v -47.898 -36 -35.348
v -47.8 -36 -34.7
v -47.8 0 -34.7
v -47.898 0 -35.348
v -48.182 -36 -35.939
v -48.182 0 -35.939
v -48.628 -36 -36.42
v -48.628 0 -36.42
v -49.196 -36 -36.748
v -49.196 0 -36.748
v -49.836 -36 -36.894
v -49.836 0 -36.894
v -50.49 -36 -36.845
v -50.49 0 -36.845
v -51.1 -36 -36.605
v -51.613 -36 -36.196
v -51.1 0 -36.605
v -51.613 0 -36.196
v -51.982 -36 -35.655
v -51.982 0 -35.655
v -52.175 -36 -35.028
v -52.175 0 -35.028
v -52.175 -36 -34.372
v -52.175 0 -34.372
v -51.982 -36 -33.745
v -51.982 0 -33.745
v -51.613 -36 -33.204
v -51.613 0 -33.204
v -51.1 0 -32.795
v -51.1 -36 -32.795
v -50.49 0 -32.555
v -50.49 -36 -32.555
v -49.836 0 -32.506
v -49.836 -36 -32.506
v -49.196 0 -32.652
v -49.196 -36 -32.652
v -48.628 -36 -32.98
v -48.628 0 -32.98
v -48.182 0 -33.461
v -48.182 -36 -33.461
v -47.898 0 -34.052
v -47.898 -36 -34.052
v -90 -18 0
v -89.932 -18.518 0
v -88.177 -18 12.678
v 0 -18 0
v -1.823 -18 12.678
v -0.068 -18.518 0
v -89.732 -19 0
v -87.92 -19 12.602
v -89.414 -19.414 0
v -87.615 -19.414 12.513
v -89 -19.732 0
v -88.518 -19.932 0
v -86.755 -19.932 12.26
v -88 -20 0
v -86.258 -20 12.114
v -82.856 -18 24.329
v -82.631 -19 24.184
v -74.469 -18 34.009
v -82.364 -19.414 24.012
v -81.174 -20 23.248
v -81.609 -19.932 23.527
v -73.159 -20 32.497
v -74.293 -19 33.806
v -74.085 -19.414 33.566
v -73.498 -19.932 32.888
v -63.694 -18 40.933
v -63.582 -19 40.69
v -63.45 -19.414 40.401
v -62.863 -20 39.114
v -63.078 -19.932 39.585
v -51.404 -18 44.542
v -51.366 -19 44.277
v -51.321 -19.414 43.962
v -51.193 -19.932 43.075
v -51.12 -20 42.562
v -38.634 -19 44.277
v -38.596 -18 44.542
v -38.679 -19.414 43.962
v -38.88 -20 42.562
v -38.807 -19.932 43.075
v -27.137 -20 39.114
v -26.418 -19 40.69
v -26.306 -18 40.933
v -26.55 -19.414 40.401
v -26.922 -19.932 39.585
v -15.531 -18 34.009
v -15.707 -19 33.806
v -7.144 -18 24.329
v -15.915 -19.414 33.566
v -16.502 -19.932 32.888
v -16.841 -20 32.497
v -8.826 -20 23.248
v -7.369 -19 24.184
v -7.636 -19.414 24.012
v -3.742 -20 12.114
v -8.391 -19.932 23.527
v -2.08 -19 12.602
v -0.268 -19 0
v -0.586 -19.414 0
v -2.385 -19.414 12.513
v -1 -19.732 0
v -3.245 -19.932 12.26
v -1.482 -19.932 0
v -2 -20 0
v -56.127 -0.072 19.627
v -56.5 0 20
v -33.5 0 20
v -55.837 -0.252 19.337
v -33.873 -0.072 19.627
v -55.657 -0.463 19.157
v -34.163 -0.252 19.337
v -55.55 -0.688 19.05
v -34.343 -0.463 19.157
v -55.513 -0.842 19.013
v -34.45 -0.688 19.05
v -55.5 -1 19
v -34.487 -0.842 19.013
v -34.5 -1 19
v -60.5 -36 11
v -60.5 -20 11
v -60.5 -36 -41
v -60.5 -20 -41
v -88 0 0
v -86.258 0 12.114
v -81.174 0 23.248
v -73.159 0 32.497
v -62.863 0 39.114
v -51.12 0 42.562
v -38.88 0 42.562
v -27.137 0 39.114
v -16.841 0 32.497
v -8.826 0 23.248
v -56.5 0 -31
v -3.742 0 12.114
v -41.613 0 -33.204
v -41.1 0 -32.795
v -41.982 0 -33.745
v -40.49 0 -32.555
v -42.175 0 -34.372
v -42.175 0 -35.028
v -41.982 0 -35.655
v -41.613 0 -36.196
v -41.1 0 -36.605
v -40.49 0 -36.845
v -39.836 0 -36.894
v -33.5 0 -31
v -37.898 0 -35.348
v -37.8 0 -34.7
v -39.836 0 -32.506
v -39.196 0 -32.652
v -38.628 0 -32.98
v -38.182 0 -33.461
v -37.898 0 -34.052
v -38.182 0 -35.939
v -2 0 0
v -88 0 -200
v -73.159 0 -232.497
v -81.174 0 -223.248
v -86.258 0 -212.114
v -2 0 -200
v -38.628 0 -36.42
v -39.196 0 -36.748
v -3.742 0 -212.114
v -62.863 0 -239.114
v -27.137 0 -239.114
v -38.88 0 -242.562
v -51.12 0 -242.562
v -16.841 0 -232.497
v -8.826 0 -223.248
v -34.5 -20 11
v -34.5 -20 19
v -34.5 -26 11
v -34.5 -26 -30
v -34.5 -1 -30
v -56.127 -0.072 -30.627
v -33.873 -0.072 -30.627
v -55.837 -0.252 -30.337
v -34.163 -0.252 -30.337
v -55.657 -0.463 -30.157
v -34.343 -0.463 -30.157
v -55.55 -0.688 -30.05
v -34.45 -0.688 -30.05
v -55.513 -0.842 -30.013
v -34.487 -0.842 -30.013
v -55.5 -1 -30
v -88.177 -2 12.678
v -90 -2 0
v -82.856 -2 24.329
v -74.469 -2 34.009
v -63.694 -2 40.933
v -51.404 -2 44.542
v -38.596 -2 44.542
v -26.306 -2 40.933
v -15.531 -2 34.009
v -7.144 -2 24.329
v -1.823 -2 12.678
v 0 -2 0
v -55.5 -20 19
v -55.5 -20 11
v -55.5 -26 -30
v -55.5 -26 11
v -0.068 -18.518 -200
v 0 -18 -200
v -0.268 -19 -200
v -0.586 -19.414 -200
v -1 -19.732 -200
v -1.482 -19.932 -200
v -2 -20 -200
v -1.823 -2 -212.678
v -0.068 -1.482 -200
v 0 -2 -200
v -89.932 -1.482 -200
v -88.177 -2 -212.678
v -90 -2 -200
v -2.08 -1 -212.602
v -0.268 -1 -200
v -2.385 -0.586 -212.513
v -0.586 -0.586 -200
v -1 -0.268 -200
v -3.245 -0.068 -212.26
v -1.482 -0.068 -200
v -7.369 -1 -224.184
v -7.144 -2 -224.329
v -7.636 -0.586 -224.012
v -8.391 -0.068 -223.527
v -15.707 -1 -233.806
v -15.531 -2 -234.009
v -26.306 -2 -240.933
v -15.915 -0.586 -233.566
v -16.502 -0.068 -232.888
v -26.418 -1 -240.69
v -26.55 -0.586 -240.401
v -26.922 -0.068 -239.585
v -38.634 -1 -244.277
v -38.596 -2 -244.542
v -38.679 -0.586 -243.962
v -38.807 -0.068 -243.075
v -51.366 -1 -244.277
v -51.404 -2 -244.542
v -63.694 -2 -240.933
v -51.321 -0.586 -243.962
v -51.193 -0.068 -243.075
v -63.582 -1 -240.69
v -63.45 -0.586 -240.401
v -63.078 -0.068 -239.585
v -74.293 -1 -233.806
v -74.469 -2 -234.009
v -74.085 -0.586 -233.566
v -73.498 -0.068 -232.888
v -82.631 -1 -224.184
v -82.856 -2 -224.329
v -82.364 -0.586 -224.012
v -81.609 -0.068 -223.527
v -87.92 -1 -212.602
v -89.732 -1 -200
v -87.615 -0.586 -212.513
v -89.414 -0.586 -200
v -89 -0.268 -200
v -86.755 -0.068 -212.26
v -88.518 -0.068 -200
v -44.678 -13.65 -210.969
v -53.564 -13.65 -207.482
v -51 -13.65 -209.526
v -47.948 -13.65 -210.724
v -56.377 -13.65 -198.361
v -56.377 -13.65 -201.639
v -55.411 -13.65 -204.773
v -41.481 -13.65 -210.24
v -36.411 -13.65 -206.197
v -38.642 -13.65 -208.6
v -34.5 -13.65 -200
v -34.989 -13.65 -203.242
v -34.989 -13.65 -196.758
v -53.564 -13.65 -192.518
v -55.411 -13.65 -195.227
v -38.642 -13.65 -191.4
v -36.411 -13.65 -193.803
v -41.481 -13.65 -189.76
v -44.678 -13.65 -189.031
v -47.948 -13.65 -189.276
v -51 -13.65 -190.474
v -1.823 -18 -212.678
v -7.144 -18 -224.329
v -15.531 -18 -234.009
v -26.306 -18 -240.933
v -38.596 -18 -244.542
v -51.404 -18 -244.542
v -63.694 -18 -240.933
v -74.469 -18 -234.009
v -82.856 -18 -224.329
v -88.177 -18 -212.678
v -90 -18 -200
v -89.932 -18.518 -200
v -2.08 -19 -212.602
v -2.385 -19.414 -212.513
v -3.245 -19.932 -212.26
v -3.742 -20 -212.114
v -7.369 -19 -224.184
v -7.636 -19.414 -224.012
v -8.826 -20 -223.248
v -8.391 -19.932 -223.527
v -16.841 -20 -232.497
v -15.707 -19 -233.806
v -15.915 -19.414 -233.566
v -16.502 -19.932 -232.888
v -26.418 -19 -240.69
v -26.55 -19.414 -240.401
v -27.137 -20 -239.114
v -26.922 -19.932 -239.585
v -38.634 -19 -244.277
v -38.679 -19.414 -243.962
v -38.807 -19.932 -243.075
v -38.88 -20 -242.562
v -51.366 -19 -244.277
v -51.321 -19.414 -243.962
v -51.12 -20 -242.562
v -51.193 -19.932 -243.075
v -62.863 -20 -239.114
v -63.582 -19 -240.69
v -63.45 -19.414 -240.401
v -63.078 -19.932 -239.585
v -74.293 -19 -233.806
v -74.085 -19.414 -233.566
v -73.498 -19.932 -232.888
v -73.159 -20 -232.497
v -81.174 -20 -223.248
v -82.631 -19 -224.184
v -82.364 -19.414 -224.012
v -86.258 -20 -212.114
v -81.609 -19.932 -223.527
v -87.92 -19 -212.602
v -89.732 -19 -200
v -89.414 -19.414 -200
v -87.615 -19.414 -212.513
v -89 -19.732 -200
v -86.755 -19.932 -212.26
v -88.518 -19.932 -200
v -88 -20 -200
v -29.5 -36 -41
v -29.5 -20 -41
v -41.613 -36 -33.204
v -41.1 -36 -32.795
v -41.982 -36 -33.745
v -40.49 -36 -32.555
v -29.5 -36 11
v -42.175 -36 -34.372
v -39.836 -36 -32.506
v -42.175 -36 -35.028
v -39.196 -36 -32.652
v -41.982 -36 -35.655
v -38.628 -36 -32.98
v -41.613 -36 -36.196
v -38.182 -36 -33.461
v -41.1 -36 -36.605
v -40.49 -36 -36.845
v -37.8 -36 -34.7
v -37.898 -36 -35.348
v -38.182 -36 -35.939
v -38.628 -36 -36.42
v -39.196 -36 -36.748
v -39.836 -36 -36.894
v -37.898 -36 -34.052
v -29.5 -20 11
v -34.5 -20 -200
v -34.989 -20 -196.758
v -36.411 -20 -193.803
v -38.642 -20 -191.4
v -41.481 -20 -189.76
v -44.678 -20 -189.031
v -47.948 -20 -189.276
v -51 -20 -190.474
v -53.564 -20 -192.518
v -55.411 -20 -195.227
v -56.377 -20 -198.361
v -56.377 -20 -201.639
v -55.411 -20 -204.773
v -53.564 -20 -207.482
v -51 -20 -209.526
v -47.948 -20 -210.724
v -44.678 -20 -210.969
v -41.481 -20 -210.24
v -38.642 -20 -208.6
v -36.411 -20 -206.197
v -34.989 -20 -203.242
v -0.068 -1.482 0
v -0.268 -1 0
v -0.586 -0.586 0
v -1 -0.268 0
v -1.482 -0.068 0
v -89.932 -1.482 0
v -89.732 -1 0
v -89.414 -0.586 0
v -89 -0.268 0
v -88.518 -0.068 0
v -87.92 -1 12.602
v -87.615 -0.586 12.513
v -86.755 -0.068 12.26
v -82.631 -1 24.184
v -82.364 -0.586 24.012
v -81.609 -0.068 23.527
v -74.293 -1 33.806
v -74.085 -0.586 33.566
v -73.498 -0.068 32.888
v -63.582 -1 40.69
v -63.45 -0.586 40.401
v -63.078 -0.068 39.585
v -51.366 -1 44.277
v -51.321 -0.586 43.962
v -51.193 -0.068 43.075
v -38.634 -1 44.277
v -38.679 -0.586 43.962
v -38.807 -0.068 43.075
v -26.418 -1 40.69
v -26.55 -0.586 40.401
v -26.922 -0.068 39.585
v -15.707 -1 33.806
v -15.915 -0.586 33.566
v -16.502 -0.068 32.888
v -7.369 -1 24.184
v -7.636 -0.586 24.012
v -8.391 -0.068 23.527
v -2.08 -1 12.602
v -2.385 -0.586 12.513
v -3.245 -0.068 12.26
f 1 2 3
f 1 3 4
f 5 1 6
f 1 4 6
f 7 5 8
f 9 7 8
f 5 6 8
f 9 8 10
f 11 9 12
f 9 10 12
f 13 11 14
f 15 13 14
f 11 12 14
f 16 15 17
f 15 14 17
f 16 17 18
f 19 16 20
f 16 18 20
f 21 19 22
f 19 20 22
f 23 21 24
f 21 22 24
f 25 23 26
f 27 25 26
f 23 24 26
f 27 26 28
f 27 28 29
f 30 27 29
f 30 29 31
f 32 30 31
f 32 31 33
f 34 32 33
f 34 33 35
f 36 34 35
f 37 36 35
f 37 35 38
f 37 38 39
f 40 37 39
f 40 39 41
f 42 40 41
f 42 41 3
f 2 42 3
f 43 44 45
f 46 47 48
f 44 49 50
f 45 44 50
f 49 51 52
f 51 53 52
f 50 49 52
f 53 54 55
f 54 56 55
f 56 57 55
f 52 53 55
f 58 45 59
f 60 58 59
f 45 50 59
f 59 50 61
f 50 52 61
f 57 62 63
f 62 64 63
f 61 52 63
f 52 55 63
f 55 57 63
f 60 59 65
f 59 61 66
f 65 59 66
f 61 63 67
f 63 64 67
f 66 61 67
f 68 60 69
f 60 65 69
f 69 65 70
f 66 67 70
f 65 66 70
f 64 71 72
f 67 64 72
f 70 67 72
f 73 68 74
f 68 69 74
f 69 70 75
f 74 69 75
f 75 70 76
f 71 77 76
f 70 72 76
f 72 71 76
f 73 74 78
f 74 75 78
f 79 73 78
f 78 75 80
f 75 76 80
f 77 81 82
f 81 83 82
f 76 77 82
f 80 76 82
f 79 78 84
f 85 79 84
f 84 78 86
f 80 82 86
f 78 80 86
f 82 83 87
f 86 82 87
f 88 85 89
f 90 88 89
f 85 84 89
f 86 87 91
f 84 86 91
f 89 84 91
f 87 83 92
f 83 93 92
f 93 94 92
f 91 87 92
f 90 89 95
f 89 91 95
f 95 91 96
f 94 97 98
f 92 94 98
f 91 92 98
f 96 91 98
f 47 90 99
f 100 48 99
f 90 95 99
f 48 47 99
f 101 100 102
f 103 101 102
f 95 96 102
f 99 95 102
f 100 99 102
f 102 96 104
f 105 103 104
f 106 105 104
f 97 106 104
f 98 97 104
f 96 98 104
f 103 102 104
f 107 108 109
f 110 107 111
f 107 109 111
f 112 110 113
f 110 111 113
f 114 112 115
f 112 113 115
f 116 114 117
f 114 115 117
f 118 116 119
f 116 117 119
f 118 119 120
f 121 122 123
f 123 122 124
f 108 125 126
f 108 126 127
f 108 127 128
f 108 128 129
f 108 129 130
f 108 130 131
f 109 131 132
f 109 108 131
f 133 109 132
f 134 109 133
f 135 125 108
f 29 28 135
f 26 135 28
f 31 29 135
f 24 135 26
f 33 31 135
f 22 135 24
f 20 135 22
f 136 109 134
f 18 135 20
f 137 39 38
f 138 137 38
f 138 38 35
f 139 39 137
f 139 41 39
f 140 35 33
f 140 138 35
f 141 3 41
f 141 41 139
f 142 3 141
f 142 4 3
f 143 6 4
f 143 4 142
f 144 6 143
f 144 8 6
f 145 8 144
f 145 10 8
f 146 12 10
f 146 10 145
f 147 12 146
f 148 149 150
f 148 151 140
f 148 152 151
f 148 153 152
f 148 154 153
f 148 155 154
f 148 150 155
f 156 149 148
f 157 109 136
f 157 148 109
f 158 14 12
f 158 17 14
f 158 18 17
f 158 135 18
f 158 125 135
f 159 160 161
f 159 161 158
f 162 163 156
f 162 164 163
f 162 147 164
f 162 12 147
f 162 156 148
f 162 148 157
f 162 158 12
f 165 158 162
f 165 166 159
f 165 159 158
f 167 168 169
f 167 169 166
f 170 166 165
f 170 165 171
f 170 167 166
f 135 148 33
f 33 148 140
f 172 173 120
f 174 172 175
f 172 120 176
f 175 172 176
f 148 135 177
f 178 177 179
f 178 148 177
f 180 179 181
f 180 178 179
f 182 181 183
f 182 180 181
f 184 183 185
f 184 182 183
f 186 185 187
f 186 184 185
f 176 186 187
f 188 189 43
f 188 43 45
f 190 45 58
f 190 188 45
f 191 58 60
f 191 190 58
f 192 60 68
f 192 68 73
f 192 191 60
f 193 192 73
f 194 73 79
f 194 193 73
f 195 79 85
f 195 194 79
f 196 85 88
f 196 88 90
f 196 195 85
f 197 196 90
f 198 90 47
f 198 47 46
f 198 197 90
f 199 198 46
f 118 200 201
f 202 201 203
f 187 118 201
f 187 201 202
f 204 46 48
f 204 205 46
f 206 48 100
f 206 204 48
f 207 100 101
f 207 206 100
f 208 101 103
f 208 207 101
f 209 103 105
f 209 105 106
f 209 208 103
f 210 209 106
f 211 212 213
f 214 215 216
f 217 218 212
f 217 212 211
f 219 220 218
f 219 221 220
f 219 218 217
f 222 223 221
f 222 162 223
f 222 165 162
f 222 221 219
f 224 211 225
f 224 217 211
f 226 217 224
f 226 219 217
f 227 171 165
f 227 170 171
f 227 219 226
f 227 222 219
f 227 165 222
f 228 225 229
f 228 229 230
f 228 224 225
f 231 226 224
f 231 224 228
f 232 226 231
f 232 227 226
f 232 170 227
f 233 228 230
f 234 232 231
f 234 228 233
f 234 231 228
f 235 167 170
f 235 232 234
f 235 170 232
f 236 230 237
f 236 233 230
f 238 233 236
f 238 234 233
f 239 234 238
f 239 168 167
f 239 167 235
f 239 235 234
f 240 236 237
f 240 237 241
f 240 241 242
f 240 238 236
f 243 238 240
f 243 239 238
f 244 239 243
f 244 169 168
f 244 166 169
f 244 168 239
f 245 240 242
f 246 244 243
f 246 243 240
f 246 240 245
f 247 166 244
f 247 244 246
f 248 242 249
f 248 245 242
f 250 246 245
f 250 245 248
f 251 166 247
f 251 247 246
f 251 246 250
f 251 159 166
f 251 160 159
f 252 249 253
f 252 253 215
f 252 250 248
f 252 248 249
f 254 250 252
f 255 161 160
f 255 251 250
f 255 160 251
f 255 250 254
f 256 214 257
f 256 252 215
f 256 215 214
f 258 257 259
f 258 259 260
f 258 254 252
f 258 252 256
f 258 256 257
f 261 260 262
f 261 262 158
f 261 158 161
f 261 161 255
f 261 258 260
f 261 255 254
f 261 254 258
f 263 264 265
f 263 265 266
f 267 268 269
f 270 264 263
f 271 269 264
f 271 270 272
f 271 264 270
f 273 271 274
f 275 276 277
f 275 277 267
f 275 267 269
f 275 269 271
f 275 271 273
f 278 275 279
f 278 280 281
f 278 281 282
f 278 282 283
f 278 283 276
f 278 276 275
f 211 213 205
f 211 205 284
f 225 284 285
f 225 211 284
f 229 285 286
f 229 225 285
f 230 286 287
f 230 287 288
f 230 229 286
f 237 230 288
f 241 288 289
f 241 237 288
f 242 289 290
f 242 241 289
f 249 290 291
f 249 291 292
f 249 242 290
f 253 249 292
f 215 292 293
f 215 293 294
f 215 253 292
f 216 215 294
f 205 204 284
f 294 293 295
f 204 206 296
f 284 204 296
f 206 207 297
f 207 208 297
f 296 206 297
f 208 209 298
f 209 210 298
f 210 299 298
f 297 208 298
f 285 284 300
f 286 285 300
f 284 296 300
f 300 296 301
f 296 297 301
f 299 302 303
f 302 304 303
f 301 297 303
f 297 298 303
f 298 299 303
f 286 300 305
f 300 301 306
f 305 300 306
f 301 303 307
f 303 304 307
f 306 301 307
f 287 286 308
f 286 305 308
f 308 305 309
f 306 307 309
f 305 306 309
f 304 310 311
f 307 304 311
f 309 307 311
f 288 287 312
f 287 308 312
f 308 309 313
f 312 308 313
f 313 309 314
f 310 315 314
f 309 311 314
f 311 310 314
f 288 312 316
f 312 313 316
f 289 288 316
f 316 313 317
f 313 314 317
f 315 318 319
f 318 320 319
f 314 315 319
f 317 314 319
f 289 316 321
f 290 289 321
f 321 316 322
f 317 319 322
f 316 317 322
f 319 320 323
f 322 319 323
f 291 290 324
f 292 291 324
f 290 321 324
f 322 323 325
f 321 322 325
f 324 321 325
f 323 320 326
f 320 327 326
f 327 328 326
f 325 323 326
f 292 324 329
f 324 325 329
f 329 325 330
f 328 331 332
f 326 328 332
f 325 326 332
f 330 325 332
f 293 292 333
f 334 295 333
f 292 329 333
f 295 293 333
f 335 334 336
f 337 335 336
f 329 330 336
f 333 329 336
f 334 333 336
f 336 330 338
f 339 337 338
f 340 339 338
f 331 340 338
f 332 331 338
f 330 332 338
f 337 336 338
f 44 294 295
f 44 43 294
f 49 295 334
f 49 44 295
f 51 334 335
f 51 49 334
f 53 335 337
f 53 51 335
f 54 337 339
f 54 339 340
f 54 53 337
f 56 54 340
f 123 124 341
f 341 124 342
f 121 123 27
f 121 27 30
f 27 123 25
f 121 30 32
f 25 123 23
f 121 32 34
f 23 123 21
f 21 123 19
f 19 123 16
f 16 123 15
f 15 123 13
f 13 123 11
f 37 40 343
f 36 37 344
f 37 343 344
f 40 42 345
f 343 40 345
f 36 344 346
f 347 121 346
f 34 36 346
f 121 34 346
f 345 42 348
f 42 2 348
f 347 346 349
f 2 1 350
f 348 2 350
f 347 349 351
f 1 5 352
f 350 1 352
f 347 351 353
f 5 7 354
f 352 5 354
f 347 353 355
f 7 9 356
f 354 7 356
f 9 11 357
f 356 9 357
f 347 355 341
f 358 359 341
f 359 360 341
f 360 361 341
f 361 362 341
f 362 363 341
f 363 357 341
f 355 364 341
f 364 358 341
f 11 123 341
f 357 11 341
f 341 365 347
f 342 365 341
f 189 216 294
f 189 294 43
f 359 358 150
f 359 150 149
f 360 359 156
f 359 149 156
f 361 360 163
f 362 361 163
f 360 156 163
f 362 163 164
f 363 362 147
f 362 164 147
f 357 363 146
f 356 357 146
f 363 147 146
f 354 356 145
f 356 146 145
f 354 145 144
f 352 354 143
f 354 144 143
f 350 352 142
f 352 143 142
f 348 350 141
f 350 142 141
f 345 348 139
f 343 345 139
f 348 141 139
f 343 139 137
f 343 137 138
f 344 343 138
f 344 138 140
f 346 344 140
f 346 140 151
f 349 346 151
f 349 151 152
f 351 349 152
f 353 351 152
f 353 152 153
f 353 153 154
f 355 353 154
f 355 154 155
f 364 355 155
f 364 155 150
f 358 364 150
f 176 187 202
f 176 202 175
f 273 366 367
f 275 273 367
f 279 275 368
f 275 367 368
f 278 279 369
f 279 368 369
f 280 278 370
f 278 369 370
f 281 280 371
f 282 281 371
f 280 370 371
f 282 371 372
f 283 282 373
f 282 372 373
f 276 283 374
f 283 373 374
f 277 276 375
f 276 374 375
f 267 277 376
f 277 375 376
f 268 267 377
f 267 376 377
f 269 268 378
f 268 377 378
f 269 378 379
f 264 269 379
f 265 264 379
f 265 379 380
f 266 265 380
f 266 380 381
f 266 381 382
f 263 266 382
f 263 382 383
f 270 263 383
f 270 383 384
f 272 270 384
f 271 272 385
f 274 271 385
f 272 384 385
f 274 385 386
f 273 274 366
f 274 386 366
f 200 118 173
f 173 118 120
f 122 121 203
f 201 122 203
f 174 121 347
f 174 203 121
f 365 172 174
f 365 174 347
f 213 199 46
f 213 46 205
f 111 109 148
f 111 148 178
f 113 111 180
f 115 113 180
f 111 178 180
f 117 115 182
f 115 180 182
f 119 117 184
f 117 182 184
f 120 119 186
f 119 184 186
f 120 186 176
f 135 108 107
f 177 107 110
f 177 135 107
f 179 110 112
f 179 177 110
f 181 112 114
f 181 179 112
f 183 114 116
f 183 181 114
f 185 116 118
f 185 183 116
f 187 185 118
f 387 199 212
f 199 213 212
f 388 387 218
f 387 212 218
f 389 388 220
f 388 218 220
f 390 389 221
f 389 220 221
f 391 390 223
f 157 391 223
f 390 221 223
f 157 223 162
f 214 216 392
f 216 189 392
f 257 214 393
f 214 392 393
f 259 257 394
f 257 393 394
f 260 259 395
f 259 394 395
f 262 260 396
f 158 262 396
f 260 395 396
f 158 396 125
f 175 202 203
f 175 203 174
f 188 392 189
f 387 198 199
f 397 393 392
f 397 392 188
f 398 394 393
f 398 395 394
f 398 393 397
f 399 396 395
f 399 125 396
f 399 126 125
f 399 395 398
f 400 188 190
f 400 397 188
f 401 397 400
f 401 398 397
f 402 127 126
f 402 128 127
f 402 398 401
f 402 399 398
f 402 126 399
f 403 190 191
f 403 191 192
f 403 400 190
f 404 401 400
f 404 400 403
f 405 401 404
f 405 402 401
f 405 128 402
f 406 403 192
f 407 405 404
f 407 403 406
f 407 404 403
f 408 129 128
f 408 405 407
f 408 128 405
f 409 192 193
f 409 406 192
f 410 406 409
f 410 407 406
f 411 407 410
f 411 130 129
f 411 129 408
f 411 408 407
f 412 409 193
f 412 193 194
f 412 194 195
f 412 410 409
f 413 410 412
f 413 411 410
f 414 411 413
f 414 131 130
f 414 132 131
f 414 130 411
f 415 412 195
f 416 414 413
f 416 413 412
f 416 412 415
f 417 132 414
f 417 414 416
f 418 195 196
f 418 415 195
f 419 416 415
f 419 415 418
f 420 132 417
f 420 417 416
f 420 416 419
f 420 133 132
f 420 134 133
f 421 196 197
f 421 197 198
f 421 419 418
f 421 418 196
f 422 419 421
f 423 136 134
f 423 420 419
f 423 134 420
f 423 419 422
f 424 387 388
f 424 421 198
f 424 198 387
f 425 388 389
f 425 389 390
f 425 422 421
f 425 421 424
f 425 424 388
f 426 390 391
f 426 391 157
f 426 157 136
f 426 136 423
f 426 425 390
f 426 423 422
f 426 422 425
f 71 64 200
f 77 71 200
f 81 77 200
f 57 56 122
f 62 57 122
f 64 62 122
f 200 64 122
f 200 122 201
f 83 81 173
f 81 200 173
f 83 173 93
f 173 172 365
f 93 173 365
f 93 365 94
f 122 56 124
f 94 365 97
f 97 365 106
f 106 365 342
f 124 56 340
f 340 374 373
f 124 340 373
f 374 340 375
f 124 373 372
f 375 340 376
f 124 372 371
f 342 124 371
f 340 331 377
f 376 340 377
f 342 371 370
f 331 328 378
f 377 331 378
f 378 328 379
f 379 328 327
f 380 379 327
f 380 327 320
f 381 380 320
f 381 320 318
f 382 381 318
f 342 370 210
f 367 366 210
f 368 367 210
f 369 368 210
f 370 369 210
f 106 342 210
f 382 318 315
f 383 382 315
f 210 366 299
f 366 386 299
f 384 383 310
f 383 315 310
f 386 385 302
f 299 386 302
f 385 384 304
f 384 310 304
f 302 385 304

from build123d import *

# Parameters (mm, degrees)
SKETCH1_R           = 2.2
BOSS_EXTRUDE1_DEPTH = 20
FILLET1_R           = 2
SKETCH4_R           = 11
CUT_EXTRUDE2_DEPTH  = 6.35
SKETCH5_W           = 31
SKETCH5_H           = 52
BOSS_EXTRUDE2_DEPTH = 36
SKETCH7_W           = 21
SKETCH7_H           = 49
CUT_EXTRUDE4_DEPTH  = 26
FILLET2_R           = 1
SKETCH8_R           = 2.2
CUT_EXTRUDE5_DEPTH  = 37


with BuildPart() as part:
    # Sketch1 → Boss-Extrude1 (new body)
    with BuildSketch(Plane(origin=(0, 0, 0), x_dir=(1, 0, 0), z_dir=(0, 1, 0))):
        with BuildLine():
            Line((0, 0), (0, 200))
            ThreePointArc((0, 200), (-45, 245), (-90, 200))
            Line((-90, 200), (-90, 0))
            ThreePointArc((-90, 0), (-45, -45), (0, 0))
        make_face()
        with Locations((-50, 34.589613301)):
            Circle(SKETCH1_R, mode=Mode.SUBTRACT)
        with Locations((-40, 34.589613301)):
            Circle(SKETCH1_R, mode=Mode.SUBTRACT)
    extrude(amount=-BOSS_EXTRUDE1_DEPTH)

    # Fillet1
    fillet1_edges = [part.edges().sort_by_distance(p)[0] for p in [
        (-45, -20, -245),
        (-90, -20, -100),
        (-45, -20, 45),
        (-90, 0, -100),
        (-45, 0, -245),
        (0, 0, -100),
        (-45, 0, 45),
        (0, -20, -100),
    ]]
    fillet(fillet1_edges, radius=FILLET1_R)

    # Sketch4 → Cut-Extrude2 (cut)
    with BuildSketch(Plane.XZ.offset(20)):
        with Locations((-45.5, -200)):
            Circle(SKETCH4_R)
    extrude(amount=-CUT_EXTRUDE2_DEPTH, mode=Mode.SUBTRACT)

    # Sketch5 → Boss-Extrude2 (add)
    with BuildSketch(Plane(origin=(0, 0, 0), x_dir=(1, 0, 0), z_dir=(0, 1, 0))):
        with Locations((-45, 15)):
            Rectangle(SKETCH5_W, SKETCH5_H)
    extrude(amount=-BOSS_EXTRUDE2_DEPTH)

    # Sketch7 → Cut-Extrude4 (cut)
    with BuildSketch(Plane(origin=(0, 0, 0), x_dir=(1, 0, 0), z_dir=(0, 1, 0))):
        with Locations((-45, 5.5)):
            Rectangle(SKETCH7_W, SKETCH7_H)
    extrude(amount=-CUT_EXTRUDE4_DEPTH, mode=Mode.SUBTRACT)

    # Fillet2
    fillet2_edges = [part.edges().sort_by_distance(p)[0] for p in [
        (-45, 0, 19),
        (-34.5, 0, -5.5),
        (-45, 0, -30),
        (-55.5, 0, -5.5),
    ]]
    fillet(fillet2_edges, radius=FILLET2_R)

    # Sketch8 → Cut-Extrude5 (cut, through all)
    with BuildSketch(Plane(origin=(0, 0, 0), x_dir=(1, 0, 0), z_dir=(0, 1, 0))):
        with Locations((-50, 34.7)):
            Circle(SKETCH8_R)
        with Locations((-40, 34.7)):
            Circle(SKETCH8_R)
    extrude(amount=-CUT_EXTRUDE5_DEPTH, mode=Mode.SUBTRACT)


solid = part.part
